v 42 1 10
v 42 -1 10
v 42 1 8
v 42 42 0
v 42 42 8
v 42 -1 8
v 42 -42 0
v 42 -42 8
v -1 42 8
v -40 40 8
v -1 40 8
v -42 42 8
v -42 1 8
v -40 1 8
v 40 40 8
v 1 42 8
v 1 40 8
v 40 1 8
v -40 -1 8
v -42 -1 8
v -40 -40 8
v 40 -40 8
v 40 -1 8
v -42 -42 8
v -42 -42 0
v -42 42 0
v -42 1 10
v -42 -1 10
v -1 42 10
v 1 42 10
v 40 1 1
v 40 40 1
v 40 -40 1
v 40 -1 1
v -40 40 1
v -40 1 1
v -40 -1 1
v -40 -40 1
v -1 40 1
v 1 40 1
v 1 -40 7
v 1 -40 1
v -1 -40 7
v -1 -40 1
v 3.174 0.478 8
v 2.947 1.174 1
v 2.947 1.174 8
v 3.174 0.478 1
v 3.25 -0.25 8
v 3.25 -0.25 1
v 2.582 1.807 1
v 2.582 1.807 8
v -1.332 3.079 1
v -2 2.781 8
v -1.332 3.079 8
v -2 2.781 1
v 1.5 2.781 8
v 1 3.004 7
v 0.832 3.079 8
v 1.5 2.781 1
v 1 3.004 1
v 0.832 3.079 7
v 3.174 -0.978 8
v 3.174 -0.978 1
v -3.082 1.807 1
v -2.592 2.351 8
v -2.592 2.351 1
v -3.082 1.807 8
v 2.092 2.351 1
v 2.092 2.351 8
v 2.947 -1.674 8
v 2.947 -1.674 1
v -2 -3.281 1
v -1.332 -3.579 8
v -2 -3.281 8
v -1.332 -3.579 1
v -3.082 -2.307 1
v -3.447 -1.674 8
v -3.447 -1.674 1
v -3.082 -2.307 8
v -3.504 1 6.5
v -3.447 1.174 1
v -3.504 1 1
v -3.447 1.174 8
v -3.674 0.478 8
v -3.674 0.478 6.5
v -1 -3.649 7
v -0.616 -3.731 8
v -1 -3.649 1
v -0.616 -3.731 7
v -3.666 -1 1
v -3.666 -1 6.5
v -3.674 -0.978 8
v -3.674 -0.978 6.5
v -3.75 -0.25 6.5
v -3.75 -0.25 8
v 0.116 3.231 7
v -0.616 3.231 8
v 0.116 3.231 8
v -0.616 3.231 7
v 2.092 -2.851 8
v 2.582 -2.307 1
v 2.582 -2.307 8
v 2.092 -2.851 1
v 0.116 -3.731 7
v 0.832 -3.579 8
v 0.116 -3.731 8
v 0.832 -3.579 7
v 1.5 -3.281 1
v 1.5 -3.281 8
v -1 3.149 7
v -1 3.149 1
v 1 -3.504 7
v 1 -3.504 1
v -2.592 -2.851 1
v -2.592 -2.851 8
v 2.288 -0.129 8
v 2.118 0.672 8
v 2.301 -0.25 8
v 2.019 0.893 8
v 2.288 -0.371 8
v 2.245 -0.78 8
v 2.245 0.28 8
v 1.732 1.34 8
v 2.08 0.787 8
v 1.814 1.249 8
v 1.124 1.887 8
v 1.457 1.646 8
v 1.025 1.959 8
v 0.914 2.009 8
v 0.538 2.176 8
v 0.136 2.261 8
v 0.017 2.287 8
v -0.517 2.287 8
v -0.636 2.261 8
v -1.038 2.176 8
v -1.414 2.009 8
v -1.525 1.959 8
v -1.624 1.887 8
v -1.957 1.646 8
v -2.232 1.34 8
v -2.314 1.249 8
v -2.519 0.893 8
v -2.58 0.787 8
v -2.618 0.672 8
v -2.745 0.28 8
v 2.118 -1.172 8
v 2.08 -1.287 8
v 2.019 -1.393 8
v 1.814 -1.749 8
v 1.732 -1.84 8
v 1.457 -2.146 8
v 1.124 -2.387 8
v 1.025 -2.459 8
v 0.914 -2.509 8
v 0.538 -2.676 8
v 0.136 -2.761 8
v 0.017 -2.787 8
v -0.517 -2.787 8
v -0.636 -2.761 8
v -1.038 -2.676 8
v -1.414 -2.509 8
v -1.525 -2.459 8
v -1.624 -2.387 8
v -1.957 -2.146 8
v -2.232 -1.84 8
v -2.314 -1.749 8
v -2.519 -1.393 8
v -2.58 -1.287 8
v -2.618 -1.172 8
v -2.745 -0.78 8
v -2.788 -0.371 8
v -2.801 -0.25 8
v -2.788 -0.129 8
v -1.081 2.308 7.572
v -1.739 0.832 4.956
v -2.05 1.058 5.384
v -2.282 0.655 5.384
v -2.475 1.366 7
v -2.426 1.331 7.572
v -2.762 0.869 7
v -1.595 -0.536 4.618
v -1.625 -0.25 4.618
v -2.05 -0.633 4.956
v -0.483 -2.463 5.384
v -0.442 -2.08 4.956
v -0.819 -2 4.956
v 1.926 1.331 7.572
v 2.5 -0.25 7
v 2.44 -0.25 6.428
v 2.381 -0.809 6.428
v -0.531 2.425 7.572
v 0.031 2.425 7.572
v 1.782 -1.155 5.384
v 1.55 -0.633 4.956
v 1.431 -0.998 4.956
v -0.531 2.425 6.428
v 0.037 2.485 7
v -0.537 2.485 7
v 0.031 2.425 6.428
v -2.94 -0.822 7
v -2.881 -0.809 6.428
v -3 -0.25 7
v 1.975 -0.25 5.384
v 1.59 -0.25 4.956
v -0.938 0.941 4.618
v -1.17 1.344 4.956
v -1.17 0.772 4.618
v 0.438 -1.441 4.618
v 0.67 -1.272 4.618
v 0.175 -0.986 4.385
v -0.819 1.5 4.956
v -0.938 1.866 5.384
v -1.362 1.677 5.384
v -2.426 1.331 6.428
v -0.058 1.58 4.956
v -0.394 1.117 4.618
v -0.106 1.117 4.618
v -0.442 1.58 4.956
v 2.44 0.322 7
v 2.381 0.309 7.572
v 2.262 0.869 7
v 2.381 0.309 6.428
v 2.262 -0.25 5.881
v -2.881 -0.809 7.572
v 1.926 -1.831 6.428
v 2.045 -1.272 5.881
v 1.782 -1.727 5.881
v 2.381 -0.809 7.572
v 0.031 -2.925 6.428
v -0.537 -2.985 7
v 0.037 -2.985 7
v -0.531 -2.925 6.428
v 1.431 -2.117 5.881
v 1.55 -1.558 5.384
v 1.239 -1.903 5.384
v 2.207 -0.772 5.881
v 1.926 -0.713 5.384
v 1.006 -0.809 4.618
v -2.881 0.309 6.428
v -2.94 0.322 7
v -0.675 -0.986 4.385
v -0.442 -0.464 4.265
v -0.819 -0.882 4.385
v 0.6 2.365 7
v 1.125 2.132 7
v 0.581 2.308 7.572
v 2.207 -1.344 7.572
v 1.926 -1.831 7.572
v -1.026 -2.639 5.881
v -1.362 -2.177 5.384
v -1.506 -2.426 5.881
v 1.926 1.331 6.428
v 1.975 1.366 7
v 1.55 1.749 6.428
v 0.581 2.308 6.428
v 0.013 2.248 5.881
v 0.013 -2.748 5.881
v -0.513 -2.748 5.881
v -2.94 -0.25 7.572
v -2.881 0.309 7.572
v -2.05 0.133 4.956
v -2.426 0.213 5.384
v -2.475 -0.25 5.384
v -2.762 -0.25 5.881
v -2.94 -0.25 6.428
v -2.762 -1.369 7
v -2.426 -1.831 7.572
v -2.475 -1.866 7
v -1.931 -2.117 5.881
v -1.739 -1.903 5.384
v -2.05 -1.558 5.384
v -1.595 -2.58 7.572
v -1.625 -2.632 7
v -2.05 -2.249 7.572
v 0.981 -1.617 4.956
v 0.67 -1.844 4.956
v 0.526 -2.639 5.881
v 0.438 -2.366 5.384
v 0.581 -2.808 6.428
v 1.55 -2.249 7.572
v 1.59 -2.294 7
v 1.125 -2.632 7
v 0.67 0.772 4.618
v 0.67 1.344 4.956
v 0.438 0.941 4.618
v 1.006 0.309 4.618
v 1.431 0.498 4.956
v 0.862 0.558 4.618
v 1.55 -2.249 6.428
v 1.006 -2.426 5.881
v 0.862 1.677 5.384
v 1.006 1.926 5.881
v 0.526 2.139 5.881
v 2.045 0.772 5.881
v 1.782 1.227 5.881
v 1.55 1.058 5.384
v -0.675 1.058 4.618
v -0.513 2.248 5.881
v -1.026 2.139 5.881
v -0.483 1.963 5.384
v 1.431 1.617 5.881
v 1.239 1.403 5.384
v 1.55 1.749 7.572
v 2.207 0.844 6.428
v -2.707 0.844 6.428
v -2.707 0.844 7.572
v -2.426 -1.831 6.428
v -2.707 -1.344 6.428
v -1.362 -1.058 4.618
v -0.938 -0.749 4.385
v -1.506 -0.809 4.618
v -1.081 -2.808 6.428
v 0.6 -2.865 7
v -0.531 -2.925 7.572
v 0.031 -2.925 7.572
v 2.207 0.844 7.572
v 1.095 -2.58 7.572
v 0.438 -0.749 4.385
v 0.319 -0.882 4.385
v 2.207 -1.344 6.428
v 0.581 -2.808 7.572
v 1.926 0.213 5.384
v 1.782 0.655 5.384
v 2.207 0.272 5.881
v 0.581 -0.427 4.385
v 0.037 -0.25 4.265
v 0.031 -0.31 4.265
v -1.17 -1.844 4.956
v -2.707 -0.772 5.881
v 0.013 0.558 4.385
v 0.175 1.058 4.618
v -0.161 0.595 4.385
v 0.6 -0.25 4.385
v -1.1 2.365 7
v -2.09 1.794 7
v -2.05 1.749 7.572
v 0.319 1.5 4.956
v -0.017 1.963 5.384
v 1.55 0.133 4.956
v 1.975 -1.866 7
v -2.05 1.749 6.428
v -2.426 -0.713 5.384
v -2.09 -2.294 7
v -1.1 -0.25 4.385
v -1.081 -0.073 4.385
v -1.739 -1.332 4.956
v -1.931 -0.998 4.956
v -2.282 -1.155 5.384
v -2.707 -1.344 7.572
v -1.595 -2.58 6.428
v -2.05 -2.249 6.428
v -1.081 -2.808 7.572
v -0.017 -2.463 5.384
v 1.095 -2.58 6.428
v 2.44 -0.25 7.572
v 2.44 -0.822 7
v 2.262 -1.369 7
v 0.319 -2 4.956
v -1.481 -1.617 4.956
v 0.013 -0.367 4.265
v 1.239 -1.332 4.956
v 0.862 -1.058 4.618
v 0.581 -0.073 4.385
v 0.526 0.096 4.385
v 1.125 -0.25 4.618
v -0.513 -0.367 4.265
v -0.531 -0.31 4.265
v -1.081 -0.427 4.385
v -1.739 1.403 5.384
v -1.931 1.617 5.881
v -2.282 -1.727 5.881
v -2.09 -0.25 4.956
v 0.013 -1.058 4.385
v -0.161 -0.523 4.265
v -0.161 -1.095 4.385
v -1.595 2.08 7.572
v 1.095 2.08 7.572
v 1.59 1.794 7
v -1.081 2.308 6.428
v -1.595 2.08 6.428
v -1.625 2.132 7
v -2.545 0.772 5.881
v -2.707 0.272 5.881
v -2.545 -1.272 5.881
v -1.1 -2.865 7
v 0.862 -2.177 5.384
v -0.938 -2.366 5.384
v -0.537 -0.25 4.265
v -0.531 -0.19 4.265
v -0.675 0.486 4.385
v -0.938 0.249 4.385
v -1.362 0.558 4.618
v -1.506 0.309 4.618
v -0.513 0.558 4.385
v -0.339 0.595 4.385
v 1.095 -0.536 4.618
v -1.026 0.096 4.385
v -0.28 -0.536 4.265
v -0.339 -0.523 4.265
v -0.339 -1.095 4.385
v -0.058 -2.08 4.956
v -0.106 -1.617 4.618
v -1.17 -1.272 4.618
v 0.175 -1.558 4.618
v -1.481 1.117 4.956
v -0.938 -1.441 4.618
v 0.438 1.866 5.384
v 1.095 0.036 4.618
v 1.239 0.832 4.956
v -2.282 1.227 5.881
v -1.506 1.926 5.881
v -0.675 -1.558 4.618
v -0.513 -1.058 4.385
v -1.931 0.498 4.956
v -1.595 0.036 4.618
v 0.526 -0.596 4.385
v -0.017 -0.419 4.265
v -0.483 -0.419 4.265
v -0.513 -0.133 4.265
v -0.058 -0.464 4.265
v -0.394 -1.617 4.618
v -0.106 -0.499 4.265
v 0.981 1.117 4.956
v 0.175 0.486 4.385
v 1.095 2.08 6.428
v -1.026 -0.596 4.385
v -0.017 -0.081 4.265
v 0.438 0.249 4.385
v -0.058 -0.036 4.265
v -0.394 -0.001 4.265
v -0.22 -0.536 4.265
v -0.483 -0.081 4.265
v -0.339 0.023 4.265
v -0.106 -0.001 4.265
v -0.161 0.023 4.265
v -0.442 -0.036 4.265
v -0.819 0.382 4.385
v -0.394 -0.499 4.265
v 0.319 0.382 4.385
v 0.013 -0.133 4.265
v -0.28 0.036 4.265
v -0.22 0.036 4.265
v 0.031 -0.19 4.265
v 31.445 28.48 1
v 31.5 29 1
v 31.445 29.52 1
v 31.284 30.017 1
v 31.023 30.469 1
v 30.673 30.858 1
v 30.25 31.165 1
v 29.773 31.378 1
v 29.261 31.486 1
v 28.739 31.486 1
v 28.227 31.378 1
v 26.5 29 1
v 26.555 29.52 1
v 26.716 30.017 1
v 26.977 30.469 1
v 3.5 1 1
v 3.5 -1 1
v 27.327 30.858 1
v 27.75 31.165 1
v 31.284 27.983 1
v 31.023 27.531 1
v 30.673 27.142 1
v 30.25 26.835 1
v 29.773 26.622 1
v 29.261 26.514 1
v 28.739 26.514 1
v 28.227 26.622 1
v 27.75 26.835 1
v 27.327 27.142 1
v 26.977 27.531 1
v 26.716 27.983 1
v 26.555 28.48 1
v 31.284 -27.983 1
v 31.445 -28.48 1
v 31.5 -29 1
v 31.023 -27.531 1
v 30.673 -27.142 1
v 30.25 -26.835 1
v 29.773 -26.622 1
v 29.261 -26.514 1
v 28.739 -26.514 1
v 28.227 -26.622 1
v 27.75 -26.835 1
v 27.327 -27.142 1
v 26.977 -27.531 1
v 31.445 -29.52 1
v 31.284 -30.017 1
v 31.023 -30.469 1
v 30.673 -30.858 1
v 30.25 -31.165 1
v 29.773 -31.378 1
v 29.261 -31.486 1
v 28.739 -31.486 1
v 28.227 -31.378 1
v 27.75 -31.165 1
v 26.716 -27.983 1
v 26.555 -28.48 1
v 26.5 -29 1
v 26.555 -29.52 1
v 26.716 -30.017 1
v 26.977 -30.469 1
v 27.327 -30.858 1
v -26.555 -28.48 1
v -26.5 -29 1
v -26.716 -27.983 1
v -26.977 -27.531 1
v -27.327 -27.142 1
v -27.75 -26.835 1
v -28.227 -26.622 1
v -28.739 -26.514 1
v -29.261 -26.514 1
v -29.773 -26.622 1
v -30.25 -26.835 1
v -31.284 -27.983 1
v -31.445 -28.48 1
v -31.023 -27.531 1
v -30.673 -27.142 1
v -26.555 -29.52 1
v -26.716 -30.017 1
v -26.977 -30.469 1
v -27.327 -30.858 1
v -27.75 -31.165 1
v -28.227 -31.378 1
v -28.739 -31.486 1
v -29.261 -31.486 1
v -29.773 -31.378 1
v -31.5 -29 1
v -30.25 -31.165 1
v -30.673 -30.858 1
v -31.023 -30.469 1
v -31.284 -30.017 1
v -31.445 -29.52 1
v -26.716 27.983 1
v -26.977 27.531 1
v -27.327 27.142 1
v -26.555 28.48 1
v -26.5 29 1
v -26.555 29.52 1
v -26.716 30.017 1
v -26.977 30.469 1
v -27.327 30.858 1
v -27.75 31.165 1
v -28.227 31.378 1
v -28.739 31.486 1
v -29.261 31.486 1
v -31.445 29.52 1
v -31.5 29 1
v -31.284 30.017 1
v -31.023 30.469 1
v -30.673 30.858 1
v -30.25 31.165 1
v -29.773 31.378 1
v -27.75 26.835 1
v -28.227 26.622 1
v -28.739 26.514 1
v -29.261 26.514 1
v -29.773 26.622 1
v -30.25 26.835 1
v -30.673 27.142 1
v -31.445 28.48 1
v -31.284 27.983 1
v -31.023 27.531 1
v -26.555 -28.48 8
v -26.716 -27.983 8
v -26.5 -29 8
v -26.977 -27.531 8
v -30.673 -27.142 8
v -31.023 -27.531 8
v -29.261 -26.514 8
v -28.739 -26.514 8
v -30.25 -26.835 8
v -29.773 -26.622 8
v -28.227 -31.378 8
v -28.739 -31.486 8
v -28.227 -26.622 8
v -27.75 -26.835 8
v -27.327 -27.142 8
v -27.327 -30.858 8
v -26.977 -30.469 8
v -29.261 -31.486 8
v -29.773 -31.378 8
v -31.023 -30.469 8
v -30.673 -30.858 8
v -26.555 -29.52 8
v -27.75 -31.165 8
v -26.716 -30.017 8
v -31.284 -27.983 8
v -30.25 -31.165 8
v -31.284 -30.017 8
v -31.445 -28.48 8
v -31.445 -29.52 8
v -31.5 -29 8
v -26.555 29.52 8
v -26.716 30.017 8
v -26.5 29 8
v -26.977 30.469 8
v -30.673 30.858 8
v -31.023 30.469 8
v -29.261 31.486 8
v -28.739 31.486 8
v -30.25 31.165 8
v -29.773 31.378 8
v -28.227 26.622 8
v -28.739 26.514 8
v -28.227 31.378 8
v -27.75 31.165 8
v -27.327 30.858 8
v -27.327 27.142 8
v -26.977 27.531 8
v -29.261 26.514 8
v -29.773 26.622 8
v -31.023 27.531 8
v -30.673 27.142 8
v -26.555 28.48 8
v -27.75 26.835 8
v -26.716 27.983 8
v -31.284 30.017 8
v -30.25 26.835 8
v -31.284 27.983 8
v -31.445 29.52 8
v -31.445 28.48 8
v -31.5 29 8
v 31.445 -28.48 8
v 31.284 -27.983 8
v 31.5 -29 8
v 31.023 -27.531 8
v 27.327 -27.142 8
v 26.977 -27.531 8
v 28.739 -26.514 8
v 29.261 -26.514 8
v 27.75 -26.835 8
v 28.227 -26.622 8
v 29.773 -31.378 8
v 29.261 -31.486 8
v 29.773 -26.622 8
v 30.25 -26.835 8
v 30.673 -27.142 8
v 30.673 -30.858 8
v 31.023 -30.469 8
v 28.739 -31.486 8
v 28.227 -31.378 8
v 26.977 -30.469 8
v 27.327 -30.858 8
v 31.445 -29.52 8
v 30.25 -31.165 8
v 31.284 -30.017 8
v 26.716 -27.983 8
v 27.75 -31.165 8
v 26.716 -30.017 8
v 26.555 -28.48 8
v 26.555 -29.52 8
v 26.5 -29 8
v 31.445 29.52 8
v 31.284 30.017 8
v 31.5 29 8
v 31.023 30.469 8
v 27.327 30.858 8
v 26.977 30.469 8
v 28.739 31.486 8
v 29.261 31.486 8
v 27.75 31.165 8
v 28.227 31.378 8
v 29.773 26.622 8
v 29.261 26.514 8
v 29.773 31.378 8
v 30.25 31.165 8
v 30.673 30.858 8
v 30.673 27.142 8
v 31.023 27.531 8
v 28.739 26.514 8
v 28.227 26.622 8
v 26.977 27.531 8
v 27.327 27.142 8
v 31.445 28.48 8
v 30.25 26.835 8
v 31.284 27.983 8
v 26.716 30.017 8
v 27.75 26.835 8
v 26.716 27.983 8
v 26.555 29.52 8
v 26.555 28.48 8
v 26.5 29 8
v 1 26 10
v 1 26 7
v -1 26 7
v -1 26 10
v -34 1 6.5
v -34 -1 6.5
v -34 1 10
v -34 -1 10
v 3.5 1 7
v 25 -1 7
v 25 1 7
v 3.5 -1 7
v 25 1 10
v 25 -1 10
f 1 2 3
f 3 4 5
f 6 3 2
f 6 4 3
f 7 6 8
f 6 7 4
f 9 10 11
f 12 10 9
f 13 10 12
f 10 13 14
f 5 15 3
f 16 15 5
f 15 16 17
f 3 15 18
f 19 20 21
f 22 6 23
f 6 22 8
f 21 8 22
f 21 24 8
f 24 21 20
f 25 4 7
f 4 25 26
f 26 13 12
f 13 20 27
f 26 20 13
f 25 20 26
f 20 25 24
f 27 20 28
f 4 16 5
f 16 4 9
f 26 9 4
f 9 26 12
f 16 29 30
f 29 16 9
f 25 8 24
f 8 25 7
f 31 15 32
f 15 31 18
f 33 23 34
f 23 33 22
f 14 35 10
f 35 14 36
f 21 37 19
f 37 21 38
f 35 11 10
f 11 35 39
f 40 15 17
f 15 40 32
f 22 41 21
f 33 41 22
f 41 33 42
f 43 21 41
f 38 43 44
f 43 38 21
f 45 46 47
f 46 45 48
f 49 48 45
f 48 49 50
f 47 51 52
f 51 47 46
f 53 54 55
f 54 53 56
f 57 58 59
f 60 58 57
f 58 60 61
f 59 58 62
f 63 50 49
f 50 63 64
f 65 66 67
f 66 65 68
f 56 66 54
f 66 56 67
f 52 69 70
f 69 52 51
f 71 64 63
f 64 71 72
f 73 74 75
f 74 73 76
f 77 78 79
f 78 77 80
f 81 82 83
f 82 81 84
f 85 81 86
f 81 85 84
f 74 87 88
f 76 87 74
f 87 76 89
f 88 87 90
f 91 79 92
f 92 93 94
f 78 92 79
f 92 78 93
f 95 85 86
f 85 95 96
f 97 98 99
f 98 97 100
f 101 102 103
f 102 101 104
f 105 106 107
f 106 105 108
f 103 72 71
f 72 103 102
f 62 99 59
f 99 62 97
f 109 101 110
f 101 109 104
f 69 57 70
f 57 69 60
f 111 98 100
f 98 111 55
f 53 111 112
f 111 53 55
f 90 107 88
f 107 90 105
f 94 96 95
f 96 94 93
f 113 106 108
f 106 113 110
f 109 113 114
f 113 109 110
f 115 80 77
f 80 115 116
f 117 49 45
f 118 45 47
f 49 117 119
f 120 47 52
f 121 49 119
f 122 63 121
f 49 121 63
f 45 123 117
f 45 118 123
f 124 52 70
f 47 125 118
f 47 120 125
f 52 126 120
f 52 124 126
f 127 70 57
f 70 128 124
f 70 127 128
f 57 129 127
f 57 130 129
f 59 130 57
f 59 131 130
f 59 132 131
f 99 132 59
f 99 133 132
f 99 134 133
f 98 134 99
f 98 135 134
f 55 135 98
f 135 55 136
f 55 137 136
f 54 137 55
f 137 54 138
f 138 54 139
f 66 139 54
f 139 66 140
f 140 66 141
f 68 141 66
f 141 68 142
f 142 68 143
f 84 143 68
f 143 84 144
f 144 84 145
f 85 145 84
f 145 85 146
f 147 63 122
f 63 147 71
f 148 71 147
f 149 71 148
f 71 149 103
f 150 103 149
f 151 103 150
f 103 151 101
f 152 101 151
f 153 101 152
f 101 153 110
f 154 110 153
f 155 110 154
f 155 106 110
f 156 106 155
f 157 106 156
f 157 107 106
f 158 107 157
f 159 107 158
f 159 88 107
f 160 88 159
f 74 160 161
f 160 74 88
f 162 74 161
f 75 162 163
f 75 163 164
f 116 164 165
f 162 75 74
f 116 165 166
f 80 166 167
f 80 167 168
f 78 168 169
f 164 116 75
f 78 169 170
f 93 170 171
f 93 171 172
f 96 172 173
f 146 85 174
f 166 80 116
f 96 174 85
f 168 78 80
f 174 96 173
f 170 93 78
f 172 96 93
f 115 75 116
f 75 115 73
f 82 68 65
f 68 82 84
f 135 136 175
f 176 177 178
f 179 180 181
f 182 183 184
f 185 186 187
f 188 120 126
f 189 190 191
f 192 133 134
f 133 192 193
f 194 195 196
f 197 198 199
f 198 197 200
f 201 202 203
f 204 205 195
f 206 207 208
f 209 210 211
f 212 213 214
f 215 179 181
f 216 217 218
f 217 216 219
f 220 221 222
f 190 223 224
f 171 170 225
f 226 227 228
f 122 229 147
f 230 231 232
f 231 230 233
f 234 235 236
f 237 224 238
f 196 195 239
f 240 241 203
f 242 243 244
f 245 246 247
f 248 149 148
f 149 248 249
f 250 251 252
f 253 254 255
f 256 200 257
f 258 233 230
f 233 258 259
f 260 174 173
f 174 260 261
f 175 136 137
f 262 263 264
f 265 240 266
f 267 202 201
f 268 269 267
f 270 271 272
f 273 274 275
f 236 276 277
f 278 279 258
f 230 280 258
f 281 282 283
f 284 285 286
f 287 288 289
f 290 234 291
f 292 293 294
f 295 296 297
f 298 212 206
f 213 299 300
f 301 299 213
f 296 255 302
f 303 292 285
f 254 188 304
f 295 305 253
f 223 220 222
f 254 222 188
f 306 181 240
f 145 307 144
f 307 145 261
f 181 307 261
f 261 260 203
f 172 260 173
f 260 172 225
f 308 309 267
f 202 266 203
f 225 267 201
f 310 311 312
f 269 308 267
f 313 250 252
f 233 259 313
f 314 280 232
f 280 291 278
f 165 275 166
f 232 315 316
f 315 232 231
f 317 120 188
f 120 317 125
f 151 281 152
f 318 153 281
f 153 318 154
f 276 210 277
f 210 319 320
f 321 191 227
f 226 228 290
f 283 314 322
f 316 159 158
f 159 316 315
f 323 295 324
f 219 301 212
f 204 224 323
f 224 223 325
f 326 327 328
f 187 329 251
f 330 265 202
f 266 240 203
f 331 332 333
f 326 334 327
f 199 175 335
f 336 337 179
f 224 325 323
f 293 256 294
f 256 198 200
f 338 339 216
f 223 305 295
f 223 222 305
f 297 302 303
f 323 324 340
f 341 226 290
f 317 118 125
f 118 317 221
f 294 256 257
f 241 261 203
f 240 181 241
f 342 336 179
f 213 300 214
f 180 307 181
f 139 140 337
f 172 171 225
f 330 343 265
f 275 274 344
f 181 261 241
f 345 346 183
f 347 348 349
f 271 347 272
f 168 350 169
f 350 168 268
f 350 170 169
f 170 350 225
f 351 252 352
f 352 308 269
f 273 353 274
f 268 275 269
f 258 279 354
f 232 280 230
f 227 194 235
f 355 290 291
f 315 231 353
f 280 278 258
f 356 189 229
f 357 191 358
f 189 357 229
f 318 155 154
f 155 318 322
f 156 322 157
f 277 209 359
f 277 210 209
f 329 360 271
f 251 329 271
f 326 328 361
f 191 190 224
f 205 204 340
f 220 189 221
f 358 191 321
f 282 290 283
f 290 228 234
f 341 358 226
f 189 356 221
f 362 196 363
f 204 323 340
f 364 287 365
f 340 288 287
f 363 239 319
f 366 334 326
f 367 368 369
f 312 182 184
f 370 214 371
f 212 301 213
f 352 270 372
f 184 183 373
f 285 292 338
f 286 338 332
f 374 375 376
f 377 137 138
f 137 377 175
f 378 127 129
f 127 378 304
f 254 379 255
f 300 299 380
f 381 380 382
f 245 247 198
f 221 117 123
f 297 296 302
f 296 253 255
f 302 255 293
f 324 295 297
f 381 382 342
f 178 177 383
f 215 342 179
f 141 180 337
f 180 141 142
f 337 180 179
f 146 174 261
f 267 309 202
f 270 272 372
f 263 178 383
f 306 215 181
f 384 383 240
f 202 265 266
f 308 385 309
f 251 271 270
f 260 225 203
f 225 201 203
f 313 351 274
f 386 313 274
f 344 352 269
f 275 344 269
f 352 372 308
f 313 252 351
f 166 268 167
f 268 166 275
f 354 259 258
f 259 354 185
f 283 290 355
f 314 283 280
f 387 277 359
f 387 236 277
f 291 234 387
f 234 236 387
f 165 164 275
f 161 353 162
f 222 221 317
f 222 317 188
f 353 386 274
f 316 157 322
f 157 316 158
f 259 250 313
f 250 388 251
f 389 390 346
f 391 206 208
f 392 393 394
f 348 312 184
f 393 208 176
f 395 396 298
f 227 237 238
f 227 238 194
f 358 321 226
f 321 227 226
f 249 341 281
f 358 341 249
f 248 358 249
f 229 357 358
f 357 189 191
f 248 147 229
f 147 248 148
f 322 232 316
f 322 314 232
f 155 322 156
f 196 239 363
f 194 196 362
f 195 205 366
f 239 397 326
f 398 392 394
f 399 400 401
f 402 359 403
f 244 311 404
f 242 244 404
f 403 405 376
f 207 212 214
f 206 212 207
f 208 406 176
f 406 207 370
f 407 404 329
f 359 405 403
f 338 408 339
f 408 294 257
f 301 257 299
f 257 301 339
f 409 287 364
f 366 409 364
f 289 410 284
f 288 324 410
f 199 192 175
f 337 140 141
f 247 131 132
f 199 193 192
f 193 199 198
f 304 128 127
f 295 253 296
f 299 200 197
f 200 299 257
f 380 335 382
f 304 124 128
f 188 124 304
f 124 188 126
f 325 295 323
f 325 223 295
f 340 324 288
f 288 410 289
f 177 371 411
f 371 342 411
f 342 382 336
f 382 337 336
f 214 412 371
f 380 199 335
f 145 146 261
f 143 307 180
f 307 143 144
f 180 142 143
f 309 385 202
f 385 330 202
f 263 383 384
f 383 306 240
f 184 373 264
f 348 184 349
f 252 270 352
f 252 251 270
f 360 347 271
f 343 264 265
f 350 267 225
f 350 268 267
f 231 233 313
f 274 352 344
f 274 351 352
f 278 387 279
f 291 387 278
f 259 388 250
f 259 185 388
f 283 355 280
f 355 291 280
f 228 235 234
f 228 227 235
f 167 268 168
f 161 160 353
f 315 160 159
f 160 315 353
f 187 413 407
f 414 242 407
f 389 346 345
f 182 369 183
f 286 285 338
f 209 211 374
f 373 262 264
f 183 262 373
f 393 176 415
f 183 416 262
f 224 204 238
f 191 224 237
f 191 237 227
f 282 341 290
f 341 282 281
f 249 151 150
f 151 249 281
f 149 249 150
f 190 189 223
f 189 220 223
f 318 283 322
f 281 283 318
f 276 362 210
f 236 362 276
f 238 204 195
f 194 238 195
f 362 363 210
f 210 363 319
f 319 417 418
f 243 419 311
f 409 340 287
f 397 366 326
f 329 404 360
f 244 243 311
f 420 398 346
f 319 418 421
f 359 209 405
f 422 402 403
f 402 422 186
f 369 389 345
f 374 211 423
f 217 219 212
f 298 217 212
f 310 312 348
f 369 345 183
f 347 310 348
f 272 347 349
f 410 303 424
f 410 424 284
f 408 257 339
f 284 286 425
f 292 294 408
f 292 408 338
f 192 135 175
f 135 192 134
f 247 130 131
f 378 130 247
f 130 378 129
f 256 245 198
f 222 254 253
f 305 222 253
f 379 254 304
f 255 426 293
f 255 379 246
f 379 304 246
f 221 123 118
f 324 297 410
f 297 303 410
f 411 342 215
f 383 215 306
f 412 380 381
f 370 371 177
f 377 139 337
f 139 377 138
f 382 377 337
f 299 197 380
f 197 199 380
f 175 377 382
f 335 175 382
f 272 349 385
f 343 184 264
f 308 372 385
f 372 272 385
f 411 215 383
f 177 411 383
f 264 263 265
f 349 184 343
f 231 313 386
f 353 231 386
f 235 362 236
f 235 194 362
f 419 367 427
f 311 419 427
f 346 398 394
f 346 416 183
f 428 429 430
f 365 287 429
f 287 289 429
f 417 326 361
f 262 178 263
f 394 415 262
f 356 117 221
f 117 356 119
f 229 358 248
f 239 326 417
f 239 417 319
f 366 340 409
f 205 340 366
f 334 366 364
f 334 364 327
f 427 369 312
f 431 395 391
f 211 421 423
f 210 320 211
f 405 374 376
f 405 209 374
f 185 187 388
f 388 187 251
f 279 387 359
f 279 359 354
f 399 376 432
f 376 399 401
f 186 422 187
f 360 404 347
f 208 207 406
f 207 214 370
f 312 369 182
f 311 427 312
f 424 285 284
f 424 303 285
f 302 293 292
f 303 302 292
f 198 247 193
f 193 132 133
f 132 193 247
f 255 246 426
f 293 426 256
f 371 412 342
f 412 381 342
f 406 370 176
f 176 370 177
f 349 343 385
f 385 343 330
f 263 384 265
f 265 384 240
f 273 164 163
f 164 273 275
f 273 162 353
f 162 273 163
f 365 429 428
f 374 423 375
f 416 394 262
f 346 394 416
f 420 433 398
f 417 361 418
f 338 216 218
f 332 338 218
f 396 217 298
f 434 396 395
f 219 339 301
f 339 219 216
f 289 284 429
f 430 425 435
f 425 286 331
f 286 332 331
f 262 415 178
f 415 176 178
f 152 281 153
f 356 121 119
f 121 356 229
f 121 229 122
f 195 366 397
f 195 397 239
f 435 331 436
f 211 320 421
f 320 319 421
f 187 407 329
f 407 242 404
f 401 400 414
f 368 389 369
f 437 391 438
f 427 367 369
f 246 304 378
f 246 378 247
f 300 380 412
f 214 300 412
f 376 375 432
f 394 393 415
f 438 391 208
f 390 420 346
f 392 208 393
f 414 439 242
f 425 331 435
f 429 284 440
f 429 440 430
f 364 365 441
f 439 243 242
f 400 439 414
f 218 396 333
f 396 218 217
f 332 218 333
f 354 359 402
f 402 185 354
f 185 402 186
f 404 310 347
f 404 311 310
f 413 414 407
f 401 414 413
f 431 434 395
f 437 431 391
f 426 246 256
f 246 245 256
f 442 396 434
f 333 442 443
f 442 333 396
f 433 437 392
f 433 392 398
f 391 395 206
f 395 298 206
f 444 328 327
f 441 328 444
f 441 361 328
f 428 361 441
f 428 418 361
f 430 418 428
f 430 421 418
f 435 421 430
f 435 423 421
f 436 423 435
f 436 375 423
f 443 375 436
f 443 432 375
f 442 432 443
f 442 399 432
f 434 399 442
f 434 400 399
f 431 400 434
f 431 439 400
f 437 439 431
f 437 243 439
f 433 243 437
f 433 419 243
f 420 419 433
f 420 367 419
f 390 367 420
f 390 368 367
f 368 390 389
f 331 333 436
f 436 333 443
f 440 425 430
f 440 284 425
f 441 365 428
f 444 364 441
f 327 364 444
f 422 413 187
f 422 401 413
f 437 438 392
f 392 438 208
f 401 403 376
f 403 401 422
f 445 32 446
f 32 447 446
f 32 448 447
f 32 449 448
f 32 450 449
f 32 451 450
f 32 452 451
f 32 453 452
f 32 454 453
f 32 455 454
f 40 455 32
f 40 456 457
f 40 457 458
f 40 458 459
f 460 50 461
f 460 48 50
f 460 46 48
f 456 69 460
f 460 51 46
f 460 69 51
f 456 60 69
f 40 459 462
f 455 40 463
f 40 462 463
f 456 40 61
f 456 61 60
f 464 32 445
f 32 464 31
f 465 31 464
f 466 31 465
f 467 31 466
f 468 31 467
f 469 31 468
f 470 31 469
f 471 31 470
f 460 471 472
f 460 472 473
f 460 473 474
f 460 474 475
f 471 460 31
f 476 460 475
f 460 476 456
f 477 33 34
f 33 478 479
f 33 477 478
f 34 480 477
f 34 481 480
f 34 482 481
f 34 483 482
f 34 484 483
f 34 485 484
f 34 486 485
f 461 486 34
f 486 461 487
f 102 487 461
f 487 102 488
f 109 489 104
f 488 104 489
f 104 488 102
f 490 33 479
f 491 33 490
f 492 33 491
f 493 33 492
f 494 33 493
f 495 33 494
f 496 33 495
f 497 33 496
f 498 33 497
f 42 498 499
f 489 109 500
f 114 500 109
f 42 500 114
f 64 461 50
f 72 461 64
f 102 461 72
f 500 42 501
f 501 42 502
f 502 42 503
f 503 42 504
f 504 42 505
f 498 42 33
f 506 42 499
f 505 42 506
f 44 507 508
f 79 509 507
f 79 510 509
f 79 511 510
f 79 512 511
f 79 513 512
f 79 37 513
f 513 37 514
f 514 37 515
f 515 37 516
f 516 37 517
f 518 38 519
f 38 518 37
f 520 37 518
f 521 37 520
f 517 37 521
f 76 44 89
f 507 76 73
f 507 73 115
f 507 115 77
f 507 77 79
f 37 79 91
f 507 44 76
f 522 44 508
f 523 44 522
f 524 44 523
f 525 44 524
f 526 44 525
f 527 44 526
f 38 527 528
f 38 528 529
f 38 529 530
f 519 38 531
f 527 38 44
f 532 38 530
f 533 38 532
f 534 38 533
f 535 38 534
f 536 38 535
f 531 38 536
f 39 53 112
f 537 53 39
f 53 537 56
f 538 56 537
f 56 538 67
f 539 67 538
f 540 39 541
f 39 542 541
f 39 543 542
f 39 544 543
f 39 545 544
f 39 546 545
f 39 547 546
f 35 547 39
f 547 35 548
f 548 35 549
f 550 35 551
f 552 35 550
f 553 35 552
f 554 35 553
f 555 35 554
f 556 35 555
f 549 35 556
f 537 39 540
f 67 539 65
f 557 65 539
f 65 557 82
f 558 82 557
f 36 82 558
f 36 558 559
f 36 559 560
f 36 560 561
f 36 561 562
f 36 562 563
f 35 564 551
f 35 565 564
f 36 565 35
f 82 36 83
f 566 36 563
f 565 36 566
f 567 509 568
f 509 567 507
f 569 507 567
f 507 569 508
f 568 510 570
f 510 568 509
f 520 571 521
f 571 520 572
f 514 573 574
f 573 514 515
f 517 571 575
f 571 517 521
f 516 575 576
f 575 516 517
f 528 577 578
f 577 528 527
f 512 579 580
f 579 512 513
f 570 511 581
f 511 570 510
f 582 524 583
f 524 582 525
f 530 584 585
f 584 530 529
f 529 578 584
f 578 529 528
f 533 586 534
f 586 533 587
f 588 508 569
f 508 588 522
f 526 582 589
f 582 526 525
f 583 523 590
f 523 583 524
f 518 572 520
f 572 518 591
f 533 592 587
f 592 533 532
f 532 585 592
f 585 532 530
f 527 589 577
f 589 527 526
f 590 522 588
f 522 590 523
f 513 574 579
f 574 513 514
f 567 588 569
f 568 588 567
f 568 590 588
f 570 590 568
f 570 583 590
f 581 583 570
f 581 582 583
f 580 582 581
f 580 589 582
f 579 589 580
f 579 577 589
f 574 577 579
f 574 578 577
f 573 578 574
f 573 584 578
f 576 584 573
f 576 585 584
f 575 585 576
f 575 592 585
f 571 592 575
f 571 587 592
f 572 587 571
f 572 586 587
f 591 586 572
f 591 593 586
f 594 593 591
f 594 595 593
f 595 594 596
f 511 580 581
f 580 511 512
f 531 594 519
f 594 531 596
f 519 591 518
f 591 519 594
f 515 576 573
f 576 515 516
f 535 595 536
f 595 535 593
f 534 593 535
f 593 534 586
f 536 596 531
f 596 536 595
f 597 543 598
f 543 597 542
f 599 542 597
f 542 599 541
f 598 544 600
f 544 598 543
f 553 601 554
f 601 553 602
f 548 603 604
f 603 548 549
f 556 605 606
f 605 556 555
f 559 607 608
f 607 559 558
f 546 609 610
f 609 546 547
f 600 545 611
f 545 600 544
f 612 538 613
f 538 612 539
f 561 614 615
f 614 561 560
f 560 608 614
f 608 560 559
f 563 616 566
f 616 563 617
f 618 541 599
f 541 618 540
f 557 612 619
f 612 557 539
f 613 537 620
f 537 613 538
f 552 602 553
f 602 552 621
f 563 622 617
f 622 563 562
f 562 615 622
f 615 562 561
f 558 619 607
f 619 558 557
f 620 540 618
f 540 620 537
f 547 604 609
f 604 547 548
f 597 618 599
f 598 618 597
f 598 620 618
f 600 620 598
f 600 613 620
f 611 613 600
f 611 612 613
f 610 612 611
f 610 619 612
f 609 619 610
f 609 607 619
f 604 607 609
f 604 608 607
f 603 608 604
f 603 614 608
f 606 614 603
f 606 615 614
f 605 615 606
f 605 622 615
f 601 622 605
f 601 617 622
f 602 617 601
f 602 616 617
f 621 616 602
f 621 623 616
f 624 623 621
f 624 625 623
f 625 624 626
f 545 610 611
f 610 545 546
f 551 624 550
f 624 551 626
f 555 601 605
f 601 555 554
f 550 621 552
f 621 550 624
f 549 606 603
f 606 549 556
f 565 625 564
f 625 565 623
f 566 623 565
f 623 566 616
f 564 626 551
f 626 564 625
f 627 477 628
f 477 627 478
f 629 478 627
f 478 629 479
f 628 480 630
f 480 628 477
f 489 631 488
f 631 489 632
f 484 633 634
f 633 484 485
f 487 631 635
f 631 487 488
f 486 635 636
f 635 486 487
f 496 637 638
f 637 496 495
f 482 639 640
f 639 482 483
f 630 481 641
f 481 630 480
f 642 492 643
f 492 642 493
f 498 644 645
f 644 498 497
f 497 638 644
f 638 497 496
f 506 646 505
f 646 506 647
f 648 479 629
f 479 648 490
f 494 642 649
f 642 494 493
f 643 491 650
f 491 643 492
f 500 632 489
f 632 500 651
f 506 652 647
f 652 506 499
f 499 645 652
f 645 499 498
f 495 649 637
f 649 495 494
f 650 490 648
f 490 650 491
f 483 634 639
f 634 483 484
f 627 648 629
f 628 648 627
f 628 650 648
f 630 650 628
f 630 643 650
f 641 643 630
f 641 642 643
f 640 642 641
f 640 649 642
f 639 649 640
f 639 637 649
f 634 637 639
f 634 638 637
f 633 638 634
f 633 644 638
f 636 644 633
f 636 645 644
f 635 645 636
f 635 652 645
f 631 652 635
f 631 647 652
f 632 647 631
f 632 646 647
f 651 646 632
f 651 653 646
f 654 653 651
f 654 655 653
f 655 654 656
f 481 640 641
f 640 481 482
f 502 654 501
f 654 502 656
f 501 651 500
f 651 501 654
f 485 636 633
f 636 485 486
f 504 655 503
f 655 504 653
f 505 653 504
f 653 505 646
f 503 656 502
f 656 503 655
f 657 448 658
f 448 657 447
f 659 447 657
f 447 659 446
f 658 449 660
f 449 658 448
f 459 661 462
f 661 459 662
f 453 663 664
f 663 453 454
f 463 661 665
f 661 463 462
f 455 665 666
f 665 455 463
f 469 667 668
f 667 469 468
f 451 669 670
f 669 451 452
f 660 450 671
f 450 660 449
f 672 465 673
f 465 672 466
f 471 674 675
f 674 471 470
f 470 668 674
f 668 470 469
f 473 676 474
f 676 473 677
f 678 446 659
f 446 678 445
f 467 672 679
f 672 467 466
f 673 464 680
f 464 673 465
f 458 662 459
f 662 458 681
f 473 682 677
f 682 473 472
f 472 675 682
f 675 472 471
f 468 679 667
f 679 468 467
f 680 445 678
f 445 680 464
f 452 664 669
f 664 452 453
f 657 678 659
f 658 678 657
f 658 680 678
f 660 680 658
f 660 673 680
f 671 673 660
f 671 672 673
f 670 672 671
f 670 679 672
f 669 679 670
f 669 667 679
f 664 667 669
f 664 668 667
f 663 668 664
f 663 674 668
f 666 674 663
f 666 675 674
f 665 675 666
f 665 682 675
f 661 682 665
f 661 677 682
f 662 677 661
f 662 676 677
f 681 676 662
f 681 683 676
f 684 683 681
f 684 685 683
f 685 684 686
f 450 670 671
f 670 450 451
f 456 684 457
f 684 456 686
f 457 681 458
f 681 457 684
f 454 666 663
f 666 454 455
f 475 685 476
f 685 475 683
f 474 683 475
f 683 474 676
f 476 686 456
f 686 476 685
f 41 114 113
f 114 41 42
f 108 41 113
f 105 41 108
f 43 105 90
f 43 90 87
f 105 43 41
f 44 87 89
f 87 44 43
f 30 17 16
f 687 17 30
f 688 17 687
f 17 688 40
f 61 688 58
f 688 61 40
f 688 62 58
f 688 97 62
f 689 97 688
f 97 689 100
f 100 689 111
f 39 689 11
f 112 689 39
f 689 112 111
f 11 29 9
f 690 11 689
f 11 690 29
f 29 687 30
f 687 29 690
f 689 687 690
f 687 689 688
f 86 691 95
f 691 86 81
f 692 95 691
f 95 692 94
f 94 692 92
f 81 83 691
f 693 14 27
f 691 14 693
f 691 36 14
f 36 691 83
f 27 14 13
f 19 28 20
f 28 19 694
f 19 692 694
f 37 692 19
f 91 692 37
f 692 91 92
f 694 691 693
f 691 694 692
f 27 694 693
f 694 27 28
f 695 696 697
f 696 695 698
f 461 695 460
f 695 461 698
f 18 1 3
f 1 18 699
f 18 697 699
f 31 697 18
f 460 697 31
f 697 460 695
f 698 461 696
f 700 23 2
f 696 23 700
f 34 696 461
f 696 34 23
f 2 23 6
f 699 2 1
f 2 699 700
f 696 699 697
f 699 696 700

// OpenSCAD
lid_dimensions = 84;
pcb_dimensions = 80;
base_depth = 10; //tot op het bord
button_height = 2;
finger_d=5;
border = (lid_dimensions - pcb_dimensions)/2;
esp_h = 3;
programmer_h = 3;
power_h = 3.5;

translate([-42,-42,0])
union()
{
  cube([lid_dimensions,lid_dimensions,1]);

  
  difference(){
    cube([lid_dimensions,lid_dimensions,base_depth-button_height]);
    translate([border,border,0])
      cube([pcb_dimensions,pcb_dimensions,base_depth+1-button_height]);
  }

  translate([40+3.5/2,40+3.5/2,0])
    difference()
    {
      cylinder(8,d=7,$fn=30);
      translate([0,0,8-1])
        sphere(d=5.5,$fn=30);
    }
    
  offset = border+11;
  offset2 = border+80-11;
  translate([offset,offset,0])
    cylinder(base_depth-button_height,d=finger_d,$fn=30);
  translate([offset,offset2,0])
    cylinder(base_depth-button_height,d=finger_d,$fn=30);
  translate([offset2,offset,0])
    cylinder(base_depth-button_height,d=finger_d,$fn=30);
  translate([offset2,offset2,0])
    cylinder(base_depth-button_height,d=finger_d,$fn=30);
    
  //esp
  translate([(lid_dimensions-border)/2,0,0])
    cube([2,lid_dimensions/2-3.5,base_depth-esp_h]);
    
  //programmer
  translate([(lid_dimensions-border)/2,45,0])
    cube([2,lid_dimensions/2-3.5,base_depth-programmer_h]);
  translate([(lid_dimensions-border)/2,45+23,0])
    cube([2,16,base_depth]);
    
  translate([0,40+1,0])
    cube([lid_dimensions/2-3.5,2,base_depth-power_h]);
  translate([0,40+1,0])
    cube([8,2,base_depth]);
  translate([42+3.5,40+1,0])
    cube([lid_dimensions/2-3.5,2,base_depth-programmer_h]);
  translate([42+3.5+21.5,40+1,0])  
    cube([17,2,base_depth]);
}
